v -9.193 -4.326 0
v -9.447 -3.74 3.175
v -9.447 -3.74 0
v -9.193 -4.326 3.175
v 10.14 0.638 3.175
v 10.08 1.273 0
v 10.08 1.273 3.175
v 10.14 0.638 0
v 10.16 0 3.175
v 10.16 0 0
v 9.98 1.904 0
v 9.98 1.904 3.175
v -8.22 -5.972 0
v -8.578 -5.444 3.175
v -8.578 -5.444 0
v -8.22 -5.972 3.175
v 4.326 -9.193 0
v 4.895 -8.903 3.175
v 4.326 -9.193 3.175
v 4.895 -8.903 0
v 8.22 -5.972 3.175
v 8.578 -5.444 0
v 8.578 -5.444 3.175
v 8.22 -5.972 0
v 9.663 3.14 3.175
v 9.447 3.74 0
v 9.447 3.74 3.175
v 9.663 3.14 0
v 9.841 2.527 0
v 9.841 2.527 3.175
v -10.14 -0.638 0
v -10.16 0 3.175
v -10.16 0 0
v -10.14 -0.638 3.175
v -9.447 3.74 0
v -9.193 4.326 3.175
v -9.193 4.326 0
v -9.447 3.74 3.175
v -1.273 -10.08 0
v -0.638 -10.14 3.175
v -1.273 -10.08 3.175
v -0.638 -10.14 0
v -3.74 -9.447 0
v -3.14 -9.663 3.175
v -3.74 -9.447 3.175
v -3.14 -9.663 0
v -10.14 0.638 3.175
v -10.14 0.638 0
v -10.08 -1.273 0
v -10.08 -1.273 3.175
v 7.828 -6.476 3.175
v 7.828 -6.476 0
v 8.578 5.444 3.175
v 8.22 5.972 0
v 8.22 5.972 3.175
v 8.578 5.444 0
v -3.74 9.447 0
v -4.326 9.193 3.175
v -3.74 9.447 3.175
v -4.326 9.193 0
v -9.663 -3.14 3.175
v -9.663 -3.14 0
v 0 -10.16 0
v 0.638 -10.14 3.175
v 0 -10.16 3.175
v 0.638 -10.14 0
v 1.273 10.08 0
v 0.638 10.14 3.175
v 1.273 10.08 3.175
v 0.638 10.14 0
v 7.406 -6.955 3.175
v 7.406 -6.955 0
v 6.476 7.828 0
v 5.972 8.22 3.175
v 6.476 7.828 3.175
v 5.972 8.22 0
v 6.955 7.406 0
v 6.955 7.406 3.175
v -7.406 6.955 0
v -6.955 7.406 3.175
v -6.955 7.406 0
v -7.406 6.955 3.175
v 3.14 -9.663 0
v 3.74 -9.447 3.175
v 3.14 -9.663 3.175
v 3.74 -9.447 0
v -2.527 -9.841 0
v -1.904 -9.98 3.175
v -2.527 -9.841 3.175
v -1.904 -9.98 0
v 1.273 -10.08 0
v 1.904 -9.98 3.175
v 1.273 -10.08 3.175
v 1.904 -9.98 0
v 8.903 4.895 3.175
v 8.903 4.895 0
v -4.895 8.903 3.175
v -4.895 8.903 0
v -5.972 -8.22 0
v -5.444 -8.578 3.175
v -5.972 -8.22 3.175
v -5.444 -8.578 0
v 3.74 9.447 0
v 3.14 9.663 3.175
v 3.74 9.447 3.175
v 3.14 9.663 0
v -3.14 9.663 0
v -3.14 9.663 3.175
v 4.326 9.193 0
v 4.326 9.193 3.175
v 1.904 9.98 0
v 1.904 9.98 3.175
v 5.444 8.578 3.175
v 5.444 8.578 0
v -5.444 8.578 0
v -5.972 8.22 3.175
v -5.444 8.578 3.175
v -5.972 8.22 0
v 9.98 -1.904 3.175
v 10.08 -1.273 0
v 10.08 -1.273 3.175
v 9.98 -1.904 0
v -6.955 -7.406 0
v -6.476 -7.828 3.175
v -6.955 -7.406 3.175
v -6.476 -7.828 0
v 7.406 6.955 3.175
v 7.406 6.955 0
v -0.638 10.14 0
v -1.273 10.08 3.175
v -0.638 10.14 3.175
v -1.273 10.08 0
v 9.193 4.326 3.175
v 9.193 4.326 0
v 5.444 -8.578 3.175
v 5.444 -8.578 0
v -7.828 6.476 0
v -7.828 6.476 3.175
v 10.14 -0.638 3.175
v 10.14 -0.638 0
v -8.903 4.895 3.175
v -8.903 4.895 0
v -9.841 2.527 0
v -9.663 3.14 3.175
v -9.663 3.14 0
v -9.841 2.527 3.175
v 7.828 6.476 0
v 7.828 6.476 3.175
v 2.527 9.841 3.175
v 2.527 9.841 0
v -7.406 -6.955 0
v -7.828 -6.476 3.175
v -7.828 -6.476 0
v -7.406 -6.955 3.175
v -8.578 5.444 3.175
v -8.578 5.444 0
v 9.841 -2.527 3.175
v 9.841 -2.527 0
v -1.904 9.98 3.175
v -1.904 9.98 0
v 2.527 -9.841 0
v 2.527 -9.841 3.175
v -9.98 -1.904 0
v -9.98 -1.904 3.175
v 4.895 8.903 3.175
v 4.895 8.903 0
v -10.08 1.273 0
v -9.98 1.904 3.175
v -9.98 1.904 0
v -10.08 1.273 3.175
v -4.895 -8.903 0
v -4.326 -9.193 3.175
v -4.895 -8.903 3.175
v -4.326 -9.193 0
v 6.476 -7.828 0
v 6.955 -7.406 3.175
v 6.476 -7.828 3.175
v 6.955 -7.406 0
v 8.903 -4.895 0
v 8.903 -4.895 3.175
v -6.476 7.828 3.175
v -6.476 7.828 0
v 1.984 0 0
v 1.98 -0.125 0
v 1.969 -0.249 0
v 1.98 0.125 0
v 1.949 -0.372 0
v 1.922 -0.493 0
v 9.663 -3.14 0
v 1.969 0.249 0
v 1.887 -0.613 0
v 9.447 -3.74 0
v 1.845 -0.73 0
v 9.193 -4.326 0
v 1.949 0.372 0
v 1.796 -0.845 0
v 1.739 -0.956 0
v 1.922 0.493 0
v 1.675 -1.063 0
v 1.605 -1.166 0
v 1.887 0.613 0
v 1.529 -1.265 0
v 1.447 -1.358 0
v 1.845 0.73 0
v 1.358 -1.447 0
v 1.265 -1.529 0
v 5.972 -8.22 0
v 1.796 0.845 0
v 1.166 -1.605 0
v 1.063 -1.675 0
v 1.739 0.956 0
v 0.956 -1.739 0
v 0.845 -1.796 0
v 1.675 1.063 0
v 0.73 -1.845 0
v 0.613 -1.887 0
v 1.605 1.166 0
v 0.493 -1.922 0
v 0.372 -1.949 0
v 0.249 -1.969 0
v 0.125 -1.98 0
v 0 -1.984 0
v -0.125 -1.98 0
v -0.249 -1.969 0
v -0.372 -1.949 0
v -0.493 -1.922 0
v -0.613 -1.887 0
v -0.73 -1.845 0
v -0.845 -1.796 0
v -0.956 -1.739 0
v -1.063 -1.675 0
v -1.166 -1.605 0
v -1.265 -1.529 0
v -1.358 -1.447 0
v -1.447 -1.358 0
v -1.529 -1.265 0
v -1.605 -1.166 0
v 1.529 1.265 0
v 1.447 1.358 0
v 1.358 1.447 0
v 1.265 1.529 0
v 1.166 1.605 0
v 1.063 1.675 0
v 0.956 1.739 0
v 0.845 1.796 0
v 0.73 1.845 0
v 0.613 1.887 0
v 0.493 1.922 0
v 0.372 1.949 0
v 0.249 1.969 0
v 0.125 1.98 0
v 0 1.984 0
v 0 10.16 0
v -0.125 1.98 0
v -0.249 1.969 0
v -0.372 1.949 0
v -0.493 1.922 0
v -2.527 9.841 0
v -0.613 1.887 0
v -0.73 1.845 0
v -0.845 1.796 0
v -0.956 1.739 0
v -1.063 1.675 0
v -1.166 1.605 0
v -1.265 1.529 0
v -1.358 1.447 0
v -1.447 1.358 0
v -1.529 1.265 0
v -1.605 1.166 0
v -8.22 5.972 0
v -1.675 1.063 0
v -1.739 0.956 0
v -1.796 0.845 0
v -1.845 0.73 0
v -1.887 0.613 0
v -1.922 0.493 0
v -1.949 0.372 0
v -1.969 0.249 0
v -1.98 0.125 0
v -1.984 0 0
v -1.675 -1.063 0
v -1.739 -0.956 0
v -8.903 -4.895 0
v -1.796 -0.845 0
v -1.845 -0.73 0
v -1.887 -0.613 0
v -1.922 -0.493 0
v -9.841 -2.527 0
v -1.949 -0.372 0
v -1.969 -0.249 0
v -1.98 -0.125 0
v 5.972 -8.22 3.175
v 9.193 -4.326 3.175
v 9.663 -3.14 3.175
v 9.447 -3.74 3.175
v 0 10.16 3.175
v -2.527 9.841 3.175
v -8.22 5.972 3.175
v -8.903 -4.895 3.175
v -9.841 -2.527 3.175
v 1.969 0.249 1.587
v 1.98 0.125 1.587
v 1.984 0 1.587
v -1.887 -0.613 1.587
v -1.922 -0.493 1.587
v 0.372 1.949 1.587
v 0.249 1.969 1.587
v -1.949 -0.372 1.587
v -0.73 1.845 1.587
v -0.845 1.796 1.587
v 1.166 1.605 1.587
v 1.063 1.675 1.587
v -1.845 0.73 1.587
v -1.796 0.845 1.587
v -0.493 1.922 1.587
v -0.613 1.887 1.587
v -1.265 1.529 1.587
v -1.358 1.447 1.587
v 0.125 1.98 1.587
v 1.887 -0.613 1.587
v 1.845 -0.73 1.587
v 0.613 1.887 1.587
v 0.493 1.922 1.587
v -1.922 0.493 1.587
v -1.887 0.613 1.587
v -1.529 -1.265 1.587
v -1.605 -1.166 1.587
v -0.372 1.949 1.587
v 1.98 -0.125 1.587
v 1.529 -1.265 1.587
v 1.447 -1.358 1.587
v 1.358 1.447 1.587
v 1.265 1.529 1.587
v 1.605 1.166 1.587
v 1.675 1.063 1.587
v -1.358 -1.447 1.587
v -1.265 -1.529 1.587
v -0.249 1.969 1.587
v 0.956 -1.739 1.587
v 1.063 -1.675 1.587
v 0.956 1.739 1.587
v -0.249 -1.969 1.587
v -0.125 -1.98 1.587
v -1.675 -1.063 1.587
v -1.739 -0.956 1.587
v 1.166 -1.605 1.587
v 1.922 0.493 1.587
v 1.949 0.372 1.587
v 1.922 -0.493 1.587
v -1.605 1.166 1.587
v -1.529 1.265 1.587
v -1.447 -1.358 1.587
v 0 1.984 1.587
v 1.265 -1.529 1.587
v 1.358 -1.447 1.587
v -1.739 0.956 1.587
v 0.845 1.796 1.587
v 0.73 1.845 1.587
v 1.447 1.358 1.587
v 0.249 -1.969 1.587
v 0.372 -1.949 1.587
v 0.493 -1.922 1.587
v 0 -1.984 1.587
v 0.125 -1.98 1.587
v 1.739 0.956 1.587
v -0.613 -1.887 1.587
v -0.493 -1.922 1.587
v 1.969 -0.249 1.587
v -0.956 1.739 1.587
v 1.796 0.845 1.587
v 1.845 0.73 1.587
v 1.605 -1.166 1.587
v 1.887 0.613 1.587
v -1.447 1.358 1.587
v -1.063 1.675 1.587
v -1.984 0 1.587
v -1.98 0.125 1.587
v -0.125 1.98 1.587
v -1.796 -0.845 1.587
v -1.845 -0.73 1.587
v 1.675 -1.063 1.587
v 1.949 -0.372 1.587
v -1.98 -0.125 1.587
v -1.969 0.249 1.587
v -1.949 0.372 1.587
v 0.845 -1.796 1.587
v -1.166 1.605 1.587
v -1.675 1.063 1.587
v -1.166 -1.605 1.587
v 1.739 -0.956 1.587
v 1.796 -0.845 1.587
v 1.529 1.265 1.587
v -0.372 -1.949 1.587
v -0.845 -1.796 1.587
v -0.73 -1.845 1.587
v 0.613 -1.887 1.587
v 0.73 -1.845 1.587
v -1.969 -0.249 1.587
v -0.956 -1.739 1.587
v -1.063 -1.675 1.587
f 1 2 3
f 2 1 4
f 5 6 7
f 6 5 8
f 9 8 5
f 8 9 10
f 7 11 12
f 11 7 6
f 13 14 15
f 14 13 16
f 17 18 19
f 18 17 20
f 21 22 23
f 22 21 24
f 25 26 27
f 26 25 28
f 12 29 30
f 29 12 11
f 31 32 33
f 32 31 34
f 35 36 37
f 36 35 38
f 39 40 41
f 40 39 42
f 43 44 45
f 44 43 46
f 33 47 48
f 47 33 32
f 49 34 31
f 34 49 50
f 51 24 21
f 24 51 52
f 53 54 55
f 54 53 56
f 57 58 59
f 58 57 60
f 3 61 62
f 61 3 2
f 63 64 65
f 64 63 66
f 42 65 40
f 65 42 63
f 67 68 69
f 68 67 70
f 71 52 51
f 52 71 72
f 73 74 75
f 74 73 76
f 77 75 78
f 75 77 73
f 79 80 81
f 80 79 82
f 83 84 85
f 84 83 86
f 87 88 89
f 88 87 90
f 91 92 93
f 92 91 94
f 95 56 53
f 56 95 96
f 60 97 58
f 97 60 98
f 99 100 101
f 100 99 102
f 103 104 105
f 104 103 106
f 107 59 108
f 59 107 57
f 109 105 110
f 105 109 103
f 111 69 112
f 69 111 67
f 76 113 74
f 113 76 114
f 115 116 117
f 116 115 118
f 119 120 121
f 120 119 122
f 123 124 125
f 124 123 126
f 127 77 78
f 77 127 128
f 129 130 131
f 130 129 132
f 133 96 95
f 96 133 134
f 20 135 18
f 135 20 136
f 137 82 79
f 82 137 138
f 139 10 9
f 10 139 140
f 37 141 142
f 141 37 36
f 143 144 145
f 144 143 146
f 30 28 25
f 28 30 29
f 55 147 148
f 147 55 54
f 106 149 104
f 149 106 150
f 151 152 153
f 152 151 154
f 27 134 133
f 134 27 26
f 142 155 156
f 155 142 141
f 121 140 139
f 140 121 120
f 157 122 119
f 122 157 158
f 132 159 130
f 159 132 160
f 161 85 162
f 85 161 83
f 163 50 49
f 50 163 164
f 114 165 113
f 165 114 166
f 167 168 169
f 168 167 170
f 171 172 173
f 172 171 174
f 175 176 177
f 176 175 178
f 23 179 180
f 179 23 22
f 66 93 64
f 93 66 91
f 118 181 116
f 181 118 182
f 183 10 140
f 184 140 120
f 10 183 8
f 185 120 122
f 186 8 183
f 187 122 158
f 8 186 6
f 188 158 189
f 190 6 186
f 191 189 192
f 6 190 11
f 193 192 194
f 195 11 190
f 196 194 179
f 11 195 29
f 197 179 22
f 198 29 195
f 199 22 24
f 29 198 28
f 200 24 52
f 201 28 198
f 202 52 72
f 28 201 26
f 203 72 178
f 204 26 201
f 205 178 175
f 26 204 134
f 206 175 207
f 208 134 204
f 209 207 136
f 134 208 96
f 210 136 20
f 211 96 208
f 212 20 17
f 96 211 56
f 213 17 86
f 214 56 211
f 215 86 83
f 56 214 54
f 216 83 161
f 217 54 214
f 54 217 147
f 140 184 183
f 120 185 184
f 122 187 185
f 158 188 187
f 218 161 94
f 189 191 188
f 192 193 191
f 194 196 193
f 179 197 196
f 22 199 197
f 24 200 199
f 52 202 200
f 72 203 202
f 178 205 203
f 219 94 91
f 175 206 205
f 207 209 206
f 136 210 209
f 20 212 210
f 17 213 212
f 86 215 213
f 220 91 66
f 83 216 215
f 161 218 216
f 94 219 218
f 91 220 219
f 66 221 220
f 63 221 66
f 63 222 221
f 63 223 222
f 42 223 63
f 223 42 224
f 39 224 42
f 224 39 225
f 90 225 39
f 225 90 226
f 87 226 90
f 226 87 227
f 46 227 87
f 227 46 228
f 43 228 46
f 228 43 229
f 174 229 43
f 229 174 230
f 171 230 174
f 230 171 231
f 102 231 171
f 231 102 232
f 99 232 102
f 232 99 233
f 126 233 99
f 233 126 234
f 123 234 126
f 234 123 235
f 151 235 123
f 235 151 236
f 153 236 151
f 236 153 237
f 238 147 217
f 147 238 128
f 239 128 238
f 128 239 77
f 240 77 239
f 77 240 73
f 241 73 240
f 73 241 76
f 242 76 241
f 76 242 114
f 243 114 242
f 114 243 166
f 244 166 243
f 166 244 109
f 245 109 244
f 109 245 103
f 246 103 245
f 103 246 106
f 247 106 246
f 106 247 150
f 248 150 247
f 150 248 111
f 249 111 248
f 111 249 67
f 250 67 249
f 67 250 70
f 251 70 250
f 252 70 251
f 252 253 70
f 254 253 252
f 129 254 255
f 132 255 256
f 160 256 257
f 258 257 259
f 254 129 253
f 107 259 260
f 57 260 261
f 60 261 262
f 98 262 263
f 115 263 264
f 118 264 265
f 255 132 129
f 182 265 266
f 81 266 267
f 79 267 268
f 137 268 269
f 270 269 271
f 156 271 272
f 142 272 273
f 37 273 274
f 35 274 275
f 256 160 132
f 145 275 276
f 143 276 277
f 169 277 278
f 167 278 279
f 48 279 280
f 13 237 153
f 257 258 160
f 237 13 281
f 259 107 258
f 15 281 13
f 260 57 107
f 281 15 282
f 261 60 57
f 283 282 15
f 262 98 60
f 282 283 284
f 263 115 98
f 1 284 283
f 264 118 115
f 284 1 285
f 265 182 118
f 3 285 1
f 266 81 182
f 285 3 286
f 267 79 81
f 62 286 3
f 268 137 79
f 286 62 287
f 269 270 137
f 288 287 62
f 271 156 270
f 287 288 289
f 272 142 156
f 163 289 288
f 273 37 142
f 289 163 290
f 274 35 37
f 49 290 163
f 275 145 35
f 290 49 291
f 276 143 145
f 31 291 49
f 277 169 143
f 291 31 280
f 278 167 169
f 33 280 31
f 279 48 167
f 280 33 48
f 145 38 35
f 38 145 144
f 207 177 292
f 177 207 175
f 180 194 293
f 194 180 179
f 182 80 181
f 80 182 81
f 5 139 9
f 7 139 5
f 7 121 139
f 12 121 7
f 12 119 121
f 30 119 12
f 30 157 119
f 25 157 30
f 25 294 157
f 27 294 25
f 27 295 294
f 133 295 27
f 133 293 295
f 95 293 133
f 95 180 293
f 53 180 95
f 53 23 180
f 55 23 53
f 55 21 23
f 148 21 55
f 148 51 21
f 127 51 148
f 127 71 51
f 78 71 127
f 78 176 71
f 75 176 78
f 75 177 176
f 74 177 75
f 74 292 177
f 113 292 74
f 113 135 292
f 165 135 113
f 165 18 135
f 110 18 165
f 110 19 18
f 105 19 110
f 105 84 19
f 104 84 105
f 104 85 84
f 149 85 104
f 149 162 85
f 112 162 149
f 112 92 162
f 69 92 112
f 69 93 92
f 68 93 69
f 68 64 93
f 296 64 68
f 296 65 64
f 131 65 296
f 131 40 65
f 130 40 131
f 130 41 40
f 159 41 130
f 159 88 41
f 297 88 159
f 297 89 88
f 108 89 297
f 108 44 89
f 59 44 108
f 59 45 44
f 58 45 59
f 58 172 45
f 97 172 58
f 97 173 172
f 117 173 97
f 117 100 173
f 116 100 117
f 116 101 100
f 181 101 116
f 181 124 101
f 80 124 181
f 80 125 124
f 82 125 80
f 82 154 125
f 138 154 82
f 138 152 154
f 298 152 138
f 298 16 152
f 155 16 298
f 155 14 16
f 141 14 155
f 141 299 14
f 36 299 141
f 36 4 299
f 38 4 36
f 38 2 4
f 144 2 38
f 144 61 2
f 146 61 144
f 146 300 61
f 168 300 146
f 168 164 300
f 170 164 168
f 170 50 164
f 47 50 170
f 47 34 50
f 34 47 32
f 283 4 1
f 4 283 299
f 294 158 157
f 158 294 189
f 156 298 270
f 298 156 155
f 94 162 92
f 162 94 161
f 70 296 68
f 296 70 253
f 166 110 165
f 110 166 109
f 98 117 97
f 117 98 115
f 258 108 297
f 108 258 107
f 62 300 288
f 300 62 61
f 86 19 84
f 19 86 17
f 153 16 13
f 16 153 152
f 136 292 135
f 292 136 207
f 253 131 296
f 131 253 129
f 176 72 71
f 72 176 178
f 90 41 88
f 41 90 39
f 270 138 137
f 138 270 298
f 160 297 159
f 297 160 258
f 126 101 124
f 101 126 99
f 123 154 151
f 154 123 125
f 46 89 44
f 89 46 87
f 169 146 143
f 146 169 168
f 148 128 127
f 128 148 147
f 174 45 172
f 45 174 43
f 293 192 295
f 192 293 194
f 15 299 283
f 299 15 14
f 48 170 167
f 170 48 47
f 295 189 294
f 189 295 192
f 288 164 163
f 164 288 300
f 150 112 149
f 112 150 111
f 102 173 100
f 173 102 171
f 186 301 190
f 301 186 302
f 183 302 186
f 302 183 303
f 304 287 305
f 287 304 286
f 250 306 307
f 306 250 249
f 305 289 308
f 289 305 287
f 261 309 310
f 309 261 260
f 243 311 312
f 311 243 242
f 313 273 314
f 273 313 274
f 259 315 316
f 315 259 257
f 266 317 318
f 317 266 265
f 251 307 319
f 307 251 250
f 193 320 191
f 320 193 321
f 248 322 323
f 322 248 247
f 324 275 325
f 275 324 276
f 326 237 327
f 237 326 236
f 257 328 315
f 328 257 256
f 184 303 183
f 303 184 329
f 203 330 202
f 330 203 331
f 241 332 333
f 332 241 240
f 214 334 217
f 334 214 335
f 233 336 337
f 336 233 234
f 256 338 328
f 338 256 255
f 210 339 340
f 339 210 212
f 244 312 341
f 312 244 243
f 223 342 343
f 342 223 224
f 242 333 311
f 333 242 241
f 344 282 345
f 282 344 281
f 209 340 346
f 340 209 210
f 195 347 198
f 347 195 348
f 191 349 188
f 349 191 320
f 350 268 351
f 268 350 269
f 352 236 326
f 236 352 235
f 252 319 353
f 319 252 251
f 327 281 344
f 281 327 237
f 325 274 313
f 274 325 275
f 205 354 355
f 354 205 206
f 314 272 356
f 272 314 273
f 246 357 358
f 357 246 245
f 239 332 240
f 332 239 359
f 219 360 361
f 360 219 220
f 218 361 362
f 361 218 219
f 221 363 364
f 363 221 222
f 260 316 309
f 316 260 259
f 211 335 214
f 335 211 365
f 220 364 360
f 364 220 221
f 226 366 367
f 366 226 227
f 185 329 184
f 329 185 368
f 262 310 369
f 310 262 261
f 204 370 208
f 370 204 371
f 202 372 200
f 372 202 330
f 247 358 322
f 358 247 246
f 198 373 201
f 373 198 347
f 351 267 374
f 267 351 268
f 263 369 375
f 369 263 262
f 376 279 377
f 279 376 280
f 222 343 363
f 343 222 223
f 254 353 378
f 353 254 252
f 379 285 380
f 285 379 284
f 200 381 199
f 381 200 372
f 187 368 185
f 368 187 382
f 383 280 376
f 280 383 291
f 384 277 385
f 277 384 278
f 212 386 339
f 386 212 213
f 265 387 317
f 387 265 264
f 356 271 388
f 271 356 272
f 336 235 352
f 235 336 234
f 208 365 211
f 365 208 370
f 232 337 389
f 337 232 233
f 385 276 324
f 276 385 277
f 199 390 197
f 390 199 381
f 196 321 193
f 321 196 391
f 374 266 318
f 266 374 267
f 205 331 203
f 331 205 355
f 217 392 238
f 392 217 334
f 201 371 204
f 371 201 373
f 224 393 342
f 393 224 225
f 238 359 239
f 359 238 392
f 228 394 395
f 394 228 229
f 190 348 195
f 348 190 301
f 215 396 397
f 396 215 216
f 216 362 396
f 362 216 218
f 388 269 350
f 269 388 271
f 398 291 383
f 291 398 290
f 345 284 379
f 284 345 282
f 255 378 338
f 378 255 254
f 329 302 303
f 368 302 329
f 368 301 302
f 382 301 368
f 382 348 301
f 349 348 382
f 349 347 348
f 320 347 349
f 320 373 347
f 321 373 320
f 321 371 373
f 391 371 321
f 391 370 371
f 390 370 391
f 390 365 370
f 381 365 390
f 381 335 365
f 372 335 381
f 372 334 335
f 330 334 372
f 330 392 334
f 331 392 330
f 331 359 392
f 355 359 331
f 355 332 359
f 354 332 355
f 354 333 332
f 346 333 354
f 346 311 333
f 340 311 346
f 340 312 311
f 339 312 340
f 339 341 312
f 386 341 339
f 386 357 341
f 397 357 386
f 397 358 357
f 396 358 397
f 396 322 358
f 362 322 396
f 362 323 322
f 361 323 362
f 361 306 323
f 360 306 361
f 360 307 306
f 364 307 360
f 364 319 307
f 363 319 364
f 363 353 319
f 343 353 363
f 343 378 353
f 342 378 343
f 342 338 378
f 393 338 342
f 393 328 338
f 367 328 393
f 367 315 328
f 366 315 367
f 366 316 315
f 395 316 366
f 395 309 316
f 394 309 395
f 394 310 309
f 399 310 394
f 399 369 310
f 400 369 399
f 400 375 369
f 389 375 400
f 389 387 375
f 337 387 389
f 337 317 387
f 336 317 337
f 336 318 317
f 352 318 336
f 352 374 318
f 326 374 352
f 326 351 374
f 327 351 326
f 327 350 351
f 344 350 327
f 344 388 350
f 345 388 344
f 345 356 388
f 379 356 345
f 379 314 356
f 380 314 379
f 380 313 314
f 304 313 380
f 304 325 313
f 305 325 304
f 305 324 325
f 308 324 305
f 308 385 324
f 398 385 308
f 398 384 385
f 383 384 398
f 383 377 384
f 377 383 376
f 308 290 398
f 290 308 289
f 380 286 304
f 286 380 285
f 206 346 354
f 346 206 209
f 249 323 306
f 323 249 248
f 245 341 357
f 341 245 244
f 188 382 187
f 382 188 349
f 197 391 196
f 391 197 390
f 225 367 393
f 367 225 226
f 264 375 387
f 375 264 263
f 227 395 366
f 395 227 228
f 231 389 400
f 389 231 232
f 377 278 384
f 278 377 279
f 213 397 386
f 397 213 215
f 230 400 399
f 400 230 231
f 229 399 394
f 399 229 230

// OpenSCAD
inch = 25.4;
$fn = 100;

difference() {
    cylinder(h = inch * 1/8, r = .8 * inch * 1/2);
    cylinder(h = inch * 1/16, r = 1.25 * inch * 1/16);
}
